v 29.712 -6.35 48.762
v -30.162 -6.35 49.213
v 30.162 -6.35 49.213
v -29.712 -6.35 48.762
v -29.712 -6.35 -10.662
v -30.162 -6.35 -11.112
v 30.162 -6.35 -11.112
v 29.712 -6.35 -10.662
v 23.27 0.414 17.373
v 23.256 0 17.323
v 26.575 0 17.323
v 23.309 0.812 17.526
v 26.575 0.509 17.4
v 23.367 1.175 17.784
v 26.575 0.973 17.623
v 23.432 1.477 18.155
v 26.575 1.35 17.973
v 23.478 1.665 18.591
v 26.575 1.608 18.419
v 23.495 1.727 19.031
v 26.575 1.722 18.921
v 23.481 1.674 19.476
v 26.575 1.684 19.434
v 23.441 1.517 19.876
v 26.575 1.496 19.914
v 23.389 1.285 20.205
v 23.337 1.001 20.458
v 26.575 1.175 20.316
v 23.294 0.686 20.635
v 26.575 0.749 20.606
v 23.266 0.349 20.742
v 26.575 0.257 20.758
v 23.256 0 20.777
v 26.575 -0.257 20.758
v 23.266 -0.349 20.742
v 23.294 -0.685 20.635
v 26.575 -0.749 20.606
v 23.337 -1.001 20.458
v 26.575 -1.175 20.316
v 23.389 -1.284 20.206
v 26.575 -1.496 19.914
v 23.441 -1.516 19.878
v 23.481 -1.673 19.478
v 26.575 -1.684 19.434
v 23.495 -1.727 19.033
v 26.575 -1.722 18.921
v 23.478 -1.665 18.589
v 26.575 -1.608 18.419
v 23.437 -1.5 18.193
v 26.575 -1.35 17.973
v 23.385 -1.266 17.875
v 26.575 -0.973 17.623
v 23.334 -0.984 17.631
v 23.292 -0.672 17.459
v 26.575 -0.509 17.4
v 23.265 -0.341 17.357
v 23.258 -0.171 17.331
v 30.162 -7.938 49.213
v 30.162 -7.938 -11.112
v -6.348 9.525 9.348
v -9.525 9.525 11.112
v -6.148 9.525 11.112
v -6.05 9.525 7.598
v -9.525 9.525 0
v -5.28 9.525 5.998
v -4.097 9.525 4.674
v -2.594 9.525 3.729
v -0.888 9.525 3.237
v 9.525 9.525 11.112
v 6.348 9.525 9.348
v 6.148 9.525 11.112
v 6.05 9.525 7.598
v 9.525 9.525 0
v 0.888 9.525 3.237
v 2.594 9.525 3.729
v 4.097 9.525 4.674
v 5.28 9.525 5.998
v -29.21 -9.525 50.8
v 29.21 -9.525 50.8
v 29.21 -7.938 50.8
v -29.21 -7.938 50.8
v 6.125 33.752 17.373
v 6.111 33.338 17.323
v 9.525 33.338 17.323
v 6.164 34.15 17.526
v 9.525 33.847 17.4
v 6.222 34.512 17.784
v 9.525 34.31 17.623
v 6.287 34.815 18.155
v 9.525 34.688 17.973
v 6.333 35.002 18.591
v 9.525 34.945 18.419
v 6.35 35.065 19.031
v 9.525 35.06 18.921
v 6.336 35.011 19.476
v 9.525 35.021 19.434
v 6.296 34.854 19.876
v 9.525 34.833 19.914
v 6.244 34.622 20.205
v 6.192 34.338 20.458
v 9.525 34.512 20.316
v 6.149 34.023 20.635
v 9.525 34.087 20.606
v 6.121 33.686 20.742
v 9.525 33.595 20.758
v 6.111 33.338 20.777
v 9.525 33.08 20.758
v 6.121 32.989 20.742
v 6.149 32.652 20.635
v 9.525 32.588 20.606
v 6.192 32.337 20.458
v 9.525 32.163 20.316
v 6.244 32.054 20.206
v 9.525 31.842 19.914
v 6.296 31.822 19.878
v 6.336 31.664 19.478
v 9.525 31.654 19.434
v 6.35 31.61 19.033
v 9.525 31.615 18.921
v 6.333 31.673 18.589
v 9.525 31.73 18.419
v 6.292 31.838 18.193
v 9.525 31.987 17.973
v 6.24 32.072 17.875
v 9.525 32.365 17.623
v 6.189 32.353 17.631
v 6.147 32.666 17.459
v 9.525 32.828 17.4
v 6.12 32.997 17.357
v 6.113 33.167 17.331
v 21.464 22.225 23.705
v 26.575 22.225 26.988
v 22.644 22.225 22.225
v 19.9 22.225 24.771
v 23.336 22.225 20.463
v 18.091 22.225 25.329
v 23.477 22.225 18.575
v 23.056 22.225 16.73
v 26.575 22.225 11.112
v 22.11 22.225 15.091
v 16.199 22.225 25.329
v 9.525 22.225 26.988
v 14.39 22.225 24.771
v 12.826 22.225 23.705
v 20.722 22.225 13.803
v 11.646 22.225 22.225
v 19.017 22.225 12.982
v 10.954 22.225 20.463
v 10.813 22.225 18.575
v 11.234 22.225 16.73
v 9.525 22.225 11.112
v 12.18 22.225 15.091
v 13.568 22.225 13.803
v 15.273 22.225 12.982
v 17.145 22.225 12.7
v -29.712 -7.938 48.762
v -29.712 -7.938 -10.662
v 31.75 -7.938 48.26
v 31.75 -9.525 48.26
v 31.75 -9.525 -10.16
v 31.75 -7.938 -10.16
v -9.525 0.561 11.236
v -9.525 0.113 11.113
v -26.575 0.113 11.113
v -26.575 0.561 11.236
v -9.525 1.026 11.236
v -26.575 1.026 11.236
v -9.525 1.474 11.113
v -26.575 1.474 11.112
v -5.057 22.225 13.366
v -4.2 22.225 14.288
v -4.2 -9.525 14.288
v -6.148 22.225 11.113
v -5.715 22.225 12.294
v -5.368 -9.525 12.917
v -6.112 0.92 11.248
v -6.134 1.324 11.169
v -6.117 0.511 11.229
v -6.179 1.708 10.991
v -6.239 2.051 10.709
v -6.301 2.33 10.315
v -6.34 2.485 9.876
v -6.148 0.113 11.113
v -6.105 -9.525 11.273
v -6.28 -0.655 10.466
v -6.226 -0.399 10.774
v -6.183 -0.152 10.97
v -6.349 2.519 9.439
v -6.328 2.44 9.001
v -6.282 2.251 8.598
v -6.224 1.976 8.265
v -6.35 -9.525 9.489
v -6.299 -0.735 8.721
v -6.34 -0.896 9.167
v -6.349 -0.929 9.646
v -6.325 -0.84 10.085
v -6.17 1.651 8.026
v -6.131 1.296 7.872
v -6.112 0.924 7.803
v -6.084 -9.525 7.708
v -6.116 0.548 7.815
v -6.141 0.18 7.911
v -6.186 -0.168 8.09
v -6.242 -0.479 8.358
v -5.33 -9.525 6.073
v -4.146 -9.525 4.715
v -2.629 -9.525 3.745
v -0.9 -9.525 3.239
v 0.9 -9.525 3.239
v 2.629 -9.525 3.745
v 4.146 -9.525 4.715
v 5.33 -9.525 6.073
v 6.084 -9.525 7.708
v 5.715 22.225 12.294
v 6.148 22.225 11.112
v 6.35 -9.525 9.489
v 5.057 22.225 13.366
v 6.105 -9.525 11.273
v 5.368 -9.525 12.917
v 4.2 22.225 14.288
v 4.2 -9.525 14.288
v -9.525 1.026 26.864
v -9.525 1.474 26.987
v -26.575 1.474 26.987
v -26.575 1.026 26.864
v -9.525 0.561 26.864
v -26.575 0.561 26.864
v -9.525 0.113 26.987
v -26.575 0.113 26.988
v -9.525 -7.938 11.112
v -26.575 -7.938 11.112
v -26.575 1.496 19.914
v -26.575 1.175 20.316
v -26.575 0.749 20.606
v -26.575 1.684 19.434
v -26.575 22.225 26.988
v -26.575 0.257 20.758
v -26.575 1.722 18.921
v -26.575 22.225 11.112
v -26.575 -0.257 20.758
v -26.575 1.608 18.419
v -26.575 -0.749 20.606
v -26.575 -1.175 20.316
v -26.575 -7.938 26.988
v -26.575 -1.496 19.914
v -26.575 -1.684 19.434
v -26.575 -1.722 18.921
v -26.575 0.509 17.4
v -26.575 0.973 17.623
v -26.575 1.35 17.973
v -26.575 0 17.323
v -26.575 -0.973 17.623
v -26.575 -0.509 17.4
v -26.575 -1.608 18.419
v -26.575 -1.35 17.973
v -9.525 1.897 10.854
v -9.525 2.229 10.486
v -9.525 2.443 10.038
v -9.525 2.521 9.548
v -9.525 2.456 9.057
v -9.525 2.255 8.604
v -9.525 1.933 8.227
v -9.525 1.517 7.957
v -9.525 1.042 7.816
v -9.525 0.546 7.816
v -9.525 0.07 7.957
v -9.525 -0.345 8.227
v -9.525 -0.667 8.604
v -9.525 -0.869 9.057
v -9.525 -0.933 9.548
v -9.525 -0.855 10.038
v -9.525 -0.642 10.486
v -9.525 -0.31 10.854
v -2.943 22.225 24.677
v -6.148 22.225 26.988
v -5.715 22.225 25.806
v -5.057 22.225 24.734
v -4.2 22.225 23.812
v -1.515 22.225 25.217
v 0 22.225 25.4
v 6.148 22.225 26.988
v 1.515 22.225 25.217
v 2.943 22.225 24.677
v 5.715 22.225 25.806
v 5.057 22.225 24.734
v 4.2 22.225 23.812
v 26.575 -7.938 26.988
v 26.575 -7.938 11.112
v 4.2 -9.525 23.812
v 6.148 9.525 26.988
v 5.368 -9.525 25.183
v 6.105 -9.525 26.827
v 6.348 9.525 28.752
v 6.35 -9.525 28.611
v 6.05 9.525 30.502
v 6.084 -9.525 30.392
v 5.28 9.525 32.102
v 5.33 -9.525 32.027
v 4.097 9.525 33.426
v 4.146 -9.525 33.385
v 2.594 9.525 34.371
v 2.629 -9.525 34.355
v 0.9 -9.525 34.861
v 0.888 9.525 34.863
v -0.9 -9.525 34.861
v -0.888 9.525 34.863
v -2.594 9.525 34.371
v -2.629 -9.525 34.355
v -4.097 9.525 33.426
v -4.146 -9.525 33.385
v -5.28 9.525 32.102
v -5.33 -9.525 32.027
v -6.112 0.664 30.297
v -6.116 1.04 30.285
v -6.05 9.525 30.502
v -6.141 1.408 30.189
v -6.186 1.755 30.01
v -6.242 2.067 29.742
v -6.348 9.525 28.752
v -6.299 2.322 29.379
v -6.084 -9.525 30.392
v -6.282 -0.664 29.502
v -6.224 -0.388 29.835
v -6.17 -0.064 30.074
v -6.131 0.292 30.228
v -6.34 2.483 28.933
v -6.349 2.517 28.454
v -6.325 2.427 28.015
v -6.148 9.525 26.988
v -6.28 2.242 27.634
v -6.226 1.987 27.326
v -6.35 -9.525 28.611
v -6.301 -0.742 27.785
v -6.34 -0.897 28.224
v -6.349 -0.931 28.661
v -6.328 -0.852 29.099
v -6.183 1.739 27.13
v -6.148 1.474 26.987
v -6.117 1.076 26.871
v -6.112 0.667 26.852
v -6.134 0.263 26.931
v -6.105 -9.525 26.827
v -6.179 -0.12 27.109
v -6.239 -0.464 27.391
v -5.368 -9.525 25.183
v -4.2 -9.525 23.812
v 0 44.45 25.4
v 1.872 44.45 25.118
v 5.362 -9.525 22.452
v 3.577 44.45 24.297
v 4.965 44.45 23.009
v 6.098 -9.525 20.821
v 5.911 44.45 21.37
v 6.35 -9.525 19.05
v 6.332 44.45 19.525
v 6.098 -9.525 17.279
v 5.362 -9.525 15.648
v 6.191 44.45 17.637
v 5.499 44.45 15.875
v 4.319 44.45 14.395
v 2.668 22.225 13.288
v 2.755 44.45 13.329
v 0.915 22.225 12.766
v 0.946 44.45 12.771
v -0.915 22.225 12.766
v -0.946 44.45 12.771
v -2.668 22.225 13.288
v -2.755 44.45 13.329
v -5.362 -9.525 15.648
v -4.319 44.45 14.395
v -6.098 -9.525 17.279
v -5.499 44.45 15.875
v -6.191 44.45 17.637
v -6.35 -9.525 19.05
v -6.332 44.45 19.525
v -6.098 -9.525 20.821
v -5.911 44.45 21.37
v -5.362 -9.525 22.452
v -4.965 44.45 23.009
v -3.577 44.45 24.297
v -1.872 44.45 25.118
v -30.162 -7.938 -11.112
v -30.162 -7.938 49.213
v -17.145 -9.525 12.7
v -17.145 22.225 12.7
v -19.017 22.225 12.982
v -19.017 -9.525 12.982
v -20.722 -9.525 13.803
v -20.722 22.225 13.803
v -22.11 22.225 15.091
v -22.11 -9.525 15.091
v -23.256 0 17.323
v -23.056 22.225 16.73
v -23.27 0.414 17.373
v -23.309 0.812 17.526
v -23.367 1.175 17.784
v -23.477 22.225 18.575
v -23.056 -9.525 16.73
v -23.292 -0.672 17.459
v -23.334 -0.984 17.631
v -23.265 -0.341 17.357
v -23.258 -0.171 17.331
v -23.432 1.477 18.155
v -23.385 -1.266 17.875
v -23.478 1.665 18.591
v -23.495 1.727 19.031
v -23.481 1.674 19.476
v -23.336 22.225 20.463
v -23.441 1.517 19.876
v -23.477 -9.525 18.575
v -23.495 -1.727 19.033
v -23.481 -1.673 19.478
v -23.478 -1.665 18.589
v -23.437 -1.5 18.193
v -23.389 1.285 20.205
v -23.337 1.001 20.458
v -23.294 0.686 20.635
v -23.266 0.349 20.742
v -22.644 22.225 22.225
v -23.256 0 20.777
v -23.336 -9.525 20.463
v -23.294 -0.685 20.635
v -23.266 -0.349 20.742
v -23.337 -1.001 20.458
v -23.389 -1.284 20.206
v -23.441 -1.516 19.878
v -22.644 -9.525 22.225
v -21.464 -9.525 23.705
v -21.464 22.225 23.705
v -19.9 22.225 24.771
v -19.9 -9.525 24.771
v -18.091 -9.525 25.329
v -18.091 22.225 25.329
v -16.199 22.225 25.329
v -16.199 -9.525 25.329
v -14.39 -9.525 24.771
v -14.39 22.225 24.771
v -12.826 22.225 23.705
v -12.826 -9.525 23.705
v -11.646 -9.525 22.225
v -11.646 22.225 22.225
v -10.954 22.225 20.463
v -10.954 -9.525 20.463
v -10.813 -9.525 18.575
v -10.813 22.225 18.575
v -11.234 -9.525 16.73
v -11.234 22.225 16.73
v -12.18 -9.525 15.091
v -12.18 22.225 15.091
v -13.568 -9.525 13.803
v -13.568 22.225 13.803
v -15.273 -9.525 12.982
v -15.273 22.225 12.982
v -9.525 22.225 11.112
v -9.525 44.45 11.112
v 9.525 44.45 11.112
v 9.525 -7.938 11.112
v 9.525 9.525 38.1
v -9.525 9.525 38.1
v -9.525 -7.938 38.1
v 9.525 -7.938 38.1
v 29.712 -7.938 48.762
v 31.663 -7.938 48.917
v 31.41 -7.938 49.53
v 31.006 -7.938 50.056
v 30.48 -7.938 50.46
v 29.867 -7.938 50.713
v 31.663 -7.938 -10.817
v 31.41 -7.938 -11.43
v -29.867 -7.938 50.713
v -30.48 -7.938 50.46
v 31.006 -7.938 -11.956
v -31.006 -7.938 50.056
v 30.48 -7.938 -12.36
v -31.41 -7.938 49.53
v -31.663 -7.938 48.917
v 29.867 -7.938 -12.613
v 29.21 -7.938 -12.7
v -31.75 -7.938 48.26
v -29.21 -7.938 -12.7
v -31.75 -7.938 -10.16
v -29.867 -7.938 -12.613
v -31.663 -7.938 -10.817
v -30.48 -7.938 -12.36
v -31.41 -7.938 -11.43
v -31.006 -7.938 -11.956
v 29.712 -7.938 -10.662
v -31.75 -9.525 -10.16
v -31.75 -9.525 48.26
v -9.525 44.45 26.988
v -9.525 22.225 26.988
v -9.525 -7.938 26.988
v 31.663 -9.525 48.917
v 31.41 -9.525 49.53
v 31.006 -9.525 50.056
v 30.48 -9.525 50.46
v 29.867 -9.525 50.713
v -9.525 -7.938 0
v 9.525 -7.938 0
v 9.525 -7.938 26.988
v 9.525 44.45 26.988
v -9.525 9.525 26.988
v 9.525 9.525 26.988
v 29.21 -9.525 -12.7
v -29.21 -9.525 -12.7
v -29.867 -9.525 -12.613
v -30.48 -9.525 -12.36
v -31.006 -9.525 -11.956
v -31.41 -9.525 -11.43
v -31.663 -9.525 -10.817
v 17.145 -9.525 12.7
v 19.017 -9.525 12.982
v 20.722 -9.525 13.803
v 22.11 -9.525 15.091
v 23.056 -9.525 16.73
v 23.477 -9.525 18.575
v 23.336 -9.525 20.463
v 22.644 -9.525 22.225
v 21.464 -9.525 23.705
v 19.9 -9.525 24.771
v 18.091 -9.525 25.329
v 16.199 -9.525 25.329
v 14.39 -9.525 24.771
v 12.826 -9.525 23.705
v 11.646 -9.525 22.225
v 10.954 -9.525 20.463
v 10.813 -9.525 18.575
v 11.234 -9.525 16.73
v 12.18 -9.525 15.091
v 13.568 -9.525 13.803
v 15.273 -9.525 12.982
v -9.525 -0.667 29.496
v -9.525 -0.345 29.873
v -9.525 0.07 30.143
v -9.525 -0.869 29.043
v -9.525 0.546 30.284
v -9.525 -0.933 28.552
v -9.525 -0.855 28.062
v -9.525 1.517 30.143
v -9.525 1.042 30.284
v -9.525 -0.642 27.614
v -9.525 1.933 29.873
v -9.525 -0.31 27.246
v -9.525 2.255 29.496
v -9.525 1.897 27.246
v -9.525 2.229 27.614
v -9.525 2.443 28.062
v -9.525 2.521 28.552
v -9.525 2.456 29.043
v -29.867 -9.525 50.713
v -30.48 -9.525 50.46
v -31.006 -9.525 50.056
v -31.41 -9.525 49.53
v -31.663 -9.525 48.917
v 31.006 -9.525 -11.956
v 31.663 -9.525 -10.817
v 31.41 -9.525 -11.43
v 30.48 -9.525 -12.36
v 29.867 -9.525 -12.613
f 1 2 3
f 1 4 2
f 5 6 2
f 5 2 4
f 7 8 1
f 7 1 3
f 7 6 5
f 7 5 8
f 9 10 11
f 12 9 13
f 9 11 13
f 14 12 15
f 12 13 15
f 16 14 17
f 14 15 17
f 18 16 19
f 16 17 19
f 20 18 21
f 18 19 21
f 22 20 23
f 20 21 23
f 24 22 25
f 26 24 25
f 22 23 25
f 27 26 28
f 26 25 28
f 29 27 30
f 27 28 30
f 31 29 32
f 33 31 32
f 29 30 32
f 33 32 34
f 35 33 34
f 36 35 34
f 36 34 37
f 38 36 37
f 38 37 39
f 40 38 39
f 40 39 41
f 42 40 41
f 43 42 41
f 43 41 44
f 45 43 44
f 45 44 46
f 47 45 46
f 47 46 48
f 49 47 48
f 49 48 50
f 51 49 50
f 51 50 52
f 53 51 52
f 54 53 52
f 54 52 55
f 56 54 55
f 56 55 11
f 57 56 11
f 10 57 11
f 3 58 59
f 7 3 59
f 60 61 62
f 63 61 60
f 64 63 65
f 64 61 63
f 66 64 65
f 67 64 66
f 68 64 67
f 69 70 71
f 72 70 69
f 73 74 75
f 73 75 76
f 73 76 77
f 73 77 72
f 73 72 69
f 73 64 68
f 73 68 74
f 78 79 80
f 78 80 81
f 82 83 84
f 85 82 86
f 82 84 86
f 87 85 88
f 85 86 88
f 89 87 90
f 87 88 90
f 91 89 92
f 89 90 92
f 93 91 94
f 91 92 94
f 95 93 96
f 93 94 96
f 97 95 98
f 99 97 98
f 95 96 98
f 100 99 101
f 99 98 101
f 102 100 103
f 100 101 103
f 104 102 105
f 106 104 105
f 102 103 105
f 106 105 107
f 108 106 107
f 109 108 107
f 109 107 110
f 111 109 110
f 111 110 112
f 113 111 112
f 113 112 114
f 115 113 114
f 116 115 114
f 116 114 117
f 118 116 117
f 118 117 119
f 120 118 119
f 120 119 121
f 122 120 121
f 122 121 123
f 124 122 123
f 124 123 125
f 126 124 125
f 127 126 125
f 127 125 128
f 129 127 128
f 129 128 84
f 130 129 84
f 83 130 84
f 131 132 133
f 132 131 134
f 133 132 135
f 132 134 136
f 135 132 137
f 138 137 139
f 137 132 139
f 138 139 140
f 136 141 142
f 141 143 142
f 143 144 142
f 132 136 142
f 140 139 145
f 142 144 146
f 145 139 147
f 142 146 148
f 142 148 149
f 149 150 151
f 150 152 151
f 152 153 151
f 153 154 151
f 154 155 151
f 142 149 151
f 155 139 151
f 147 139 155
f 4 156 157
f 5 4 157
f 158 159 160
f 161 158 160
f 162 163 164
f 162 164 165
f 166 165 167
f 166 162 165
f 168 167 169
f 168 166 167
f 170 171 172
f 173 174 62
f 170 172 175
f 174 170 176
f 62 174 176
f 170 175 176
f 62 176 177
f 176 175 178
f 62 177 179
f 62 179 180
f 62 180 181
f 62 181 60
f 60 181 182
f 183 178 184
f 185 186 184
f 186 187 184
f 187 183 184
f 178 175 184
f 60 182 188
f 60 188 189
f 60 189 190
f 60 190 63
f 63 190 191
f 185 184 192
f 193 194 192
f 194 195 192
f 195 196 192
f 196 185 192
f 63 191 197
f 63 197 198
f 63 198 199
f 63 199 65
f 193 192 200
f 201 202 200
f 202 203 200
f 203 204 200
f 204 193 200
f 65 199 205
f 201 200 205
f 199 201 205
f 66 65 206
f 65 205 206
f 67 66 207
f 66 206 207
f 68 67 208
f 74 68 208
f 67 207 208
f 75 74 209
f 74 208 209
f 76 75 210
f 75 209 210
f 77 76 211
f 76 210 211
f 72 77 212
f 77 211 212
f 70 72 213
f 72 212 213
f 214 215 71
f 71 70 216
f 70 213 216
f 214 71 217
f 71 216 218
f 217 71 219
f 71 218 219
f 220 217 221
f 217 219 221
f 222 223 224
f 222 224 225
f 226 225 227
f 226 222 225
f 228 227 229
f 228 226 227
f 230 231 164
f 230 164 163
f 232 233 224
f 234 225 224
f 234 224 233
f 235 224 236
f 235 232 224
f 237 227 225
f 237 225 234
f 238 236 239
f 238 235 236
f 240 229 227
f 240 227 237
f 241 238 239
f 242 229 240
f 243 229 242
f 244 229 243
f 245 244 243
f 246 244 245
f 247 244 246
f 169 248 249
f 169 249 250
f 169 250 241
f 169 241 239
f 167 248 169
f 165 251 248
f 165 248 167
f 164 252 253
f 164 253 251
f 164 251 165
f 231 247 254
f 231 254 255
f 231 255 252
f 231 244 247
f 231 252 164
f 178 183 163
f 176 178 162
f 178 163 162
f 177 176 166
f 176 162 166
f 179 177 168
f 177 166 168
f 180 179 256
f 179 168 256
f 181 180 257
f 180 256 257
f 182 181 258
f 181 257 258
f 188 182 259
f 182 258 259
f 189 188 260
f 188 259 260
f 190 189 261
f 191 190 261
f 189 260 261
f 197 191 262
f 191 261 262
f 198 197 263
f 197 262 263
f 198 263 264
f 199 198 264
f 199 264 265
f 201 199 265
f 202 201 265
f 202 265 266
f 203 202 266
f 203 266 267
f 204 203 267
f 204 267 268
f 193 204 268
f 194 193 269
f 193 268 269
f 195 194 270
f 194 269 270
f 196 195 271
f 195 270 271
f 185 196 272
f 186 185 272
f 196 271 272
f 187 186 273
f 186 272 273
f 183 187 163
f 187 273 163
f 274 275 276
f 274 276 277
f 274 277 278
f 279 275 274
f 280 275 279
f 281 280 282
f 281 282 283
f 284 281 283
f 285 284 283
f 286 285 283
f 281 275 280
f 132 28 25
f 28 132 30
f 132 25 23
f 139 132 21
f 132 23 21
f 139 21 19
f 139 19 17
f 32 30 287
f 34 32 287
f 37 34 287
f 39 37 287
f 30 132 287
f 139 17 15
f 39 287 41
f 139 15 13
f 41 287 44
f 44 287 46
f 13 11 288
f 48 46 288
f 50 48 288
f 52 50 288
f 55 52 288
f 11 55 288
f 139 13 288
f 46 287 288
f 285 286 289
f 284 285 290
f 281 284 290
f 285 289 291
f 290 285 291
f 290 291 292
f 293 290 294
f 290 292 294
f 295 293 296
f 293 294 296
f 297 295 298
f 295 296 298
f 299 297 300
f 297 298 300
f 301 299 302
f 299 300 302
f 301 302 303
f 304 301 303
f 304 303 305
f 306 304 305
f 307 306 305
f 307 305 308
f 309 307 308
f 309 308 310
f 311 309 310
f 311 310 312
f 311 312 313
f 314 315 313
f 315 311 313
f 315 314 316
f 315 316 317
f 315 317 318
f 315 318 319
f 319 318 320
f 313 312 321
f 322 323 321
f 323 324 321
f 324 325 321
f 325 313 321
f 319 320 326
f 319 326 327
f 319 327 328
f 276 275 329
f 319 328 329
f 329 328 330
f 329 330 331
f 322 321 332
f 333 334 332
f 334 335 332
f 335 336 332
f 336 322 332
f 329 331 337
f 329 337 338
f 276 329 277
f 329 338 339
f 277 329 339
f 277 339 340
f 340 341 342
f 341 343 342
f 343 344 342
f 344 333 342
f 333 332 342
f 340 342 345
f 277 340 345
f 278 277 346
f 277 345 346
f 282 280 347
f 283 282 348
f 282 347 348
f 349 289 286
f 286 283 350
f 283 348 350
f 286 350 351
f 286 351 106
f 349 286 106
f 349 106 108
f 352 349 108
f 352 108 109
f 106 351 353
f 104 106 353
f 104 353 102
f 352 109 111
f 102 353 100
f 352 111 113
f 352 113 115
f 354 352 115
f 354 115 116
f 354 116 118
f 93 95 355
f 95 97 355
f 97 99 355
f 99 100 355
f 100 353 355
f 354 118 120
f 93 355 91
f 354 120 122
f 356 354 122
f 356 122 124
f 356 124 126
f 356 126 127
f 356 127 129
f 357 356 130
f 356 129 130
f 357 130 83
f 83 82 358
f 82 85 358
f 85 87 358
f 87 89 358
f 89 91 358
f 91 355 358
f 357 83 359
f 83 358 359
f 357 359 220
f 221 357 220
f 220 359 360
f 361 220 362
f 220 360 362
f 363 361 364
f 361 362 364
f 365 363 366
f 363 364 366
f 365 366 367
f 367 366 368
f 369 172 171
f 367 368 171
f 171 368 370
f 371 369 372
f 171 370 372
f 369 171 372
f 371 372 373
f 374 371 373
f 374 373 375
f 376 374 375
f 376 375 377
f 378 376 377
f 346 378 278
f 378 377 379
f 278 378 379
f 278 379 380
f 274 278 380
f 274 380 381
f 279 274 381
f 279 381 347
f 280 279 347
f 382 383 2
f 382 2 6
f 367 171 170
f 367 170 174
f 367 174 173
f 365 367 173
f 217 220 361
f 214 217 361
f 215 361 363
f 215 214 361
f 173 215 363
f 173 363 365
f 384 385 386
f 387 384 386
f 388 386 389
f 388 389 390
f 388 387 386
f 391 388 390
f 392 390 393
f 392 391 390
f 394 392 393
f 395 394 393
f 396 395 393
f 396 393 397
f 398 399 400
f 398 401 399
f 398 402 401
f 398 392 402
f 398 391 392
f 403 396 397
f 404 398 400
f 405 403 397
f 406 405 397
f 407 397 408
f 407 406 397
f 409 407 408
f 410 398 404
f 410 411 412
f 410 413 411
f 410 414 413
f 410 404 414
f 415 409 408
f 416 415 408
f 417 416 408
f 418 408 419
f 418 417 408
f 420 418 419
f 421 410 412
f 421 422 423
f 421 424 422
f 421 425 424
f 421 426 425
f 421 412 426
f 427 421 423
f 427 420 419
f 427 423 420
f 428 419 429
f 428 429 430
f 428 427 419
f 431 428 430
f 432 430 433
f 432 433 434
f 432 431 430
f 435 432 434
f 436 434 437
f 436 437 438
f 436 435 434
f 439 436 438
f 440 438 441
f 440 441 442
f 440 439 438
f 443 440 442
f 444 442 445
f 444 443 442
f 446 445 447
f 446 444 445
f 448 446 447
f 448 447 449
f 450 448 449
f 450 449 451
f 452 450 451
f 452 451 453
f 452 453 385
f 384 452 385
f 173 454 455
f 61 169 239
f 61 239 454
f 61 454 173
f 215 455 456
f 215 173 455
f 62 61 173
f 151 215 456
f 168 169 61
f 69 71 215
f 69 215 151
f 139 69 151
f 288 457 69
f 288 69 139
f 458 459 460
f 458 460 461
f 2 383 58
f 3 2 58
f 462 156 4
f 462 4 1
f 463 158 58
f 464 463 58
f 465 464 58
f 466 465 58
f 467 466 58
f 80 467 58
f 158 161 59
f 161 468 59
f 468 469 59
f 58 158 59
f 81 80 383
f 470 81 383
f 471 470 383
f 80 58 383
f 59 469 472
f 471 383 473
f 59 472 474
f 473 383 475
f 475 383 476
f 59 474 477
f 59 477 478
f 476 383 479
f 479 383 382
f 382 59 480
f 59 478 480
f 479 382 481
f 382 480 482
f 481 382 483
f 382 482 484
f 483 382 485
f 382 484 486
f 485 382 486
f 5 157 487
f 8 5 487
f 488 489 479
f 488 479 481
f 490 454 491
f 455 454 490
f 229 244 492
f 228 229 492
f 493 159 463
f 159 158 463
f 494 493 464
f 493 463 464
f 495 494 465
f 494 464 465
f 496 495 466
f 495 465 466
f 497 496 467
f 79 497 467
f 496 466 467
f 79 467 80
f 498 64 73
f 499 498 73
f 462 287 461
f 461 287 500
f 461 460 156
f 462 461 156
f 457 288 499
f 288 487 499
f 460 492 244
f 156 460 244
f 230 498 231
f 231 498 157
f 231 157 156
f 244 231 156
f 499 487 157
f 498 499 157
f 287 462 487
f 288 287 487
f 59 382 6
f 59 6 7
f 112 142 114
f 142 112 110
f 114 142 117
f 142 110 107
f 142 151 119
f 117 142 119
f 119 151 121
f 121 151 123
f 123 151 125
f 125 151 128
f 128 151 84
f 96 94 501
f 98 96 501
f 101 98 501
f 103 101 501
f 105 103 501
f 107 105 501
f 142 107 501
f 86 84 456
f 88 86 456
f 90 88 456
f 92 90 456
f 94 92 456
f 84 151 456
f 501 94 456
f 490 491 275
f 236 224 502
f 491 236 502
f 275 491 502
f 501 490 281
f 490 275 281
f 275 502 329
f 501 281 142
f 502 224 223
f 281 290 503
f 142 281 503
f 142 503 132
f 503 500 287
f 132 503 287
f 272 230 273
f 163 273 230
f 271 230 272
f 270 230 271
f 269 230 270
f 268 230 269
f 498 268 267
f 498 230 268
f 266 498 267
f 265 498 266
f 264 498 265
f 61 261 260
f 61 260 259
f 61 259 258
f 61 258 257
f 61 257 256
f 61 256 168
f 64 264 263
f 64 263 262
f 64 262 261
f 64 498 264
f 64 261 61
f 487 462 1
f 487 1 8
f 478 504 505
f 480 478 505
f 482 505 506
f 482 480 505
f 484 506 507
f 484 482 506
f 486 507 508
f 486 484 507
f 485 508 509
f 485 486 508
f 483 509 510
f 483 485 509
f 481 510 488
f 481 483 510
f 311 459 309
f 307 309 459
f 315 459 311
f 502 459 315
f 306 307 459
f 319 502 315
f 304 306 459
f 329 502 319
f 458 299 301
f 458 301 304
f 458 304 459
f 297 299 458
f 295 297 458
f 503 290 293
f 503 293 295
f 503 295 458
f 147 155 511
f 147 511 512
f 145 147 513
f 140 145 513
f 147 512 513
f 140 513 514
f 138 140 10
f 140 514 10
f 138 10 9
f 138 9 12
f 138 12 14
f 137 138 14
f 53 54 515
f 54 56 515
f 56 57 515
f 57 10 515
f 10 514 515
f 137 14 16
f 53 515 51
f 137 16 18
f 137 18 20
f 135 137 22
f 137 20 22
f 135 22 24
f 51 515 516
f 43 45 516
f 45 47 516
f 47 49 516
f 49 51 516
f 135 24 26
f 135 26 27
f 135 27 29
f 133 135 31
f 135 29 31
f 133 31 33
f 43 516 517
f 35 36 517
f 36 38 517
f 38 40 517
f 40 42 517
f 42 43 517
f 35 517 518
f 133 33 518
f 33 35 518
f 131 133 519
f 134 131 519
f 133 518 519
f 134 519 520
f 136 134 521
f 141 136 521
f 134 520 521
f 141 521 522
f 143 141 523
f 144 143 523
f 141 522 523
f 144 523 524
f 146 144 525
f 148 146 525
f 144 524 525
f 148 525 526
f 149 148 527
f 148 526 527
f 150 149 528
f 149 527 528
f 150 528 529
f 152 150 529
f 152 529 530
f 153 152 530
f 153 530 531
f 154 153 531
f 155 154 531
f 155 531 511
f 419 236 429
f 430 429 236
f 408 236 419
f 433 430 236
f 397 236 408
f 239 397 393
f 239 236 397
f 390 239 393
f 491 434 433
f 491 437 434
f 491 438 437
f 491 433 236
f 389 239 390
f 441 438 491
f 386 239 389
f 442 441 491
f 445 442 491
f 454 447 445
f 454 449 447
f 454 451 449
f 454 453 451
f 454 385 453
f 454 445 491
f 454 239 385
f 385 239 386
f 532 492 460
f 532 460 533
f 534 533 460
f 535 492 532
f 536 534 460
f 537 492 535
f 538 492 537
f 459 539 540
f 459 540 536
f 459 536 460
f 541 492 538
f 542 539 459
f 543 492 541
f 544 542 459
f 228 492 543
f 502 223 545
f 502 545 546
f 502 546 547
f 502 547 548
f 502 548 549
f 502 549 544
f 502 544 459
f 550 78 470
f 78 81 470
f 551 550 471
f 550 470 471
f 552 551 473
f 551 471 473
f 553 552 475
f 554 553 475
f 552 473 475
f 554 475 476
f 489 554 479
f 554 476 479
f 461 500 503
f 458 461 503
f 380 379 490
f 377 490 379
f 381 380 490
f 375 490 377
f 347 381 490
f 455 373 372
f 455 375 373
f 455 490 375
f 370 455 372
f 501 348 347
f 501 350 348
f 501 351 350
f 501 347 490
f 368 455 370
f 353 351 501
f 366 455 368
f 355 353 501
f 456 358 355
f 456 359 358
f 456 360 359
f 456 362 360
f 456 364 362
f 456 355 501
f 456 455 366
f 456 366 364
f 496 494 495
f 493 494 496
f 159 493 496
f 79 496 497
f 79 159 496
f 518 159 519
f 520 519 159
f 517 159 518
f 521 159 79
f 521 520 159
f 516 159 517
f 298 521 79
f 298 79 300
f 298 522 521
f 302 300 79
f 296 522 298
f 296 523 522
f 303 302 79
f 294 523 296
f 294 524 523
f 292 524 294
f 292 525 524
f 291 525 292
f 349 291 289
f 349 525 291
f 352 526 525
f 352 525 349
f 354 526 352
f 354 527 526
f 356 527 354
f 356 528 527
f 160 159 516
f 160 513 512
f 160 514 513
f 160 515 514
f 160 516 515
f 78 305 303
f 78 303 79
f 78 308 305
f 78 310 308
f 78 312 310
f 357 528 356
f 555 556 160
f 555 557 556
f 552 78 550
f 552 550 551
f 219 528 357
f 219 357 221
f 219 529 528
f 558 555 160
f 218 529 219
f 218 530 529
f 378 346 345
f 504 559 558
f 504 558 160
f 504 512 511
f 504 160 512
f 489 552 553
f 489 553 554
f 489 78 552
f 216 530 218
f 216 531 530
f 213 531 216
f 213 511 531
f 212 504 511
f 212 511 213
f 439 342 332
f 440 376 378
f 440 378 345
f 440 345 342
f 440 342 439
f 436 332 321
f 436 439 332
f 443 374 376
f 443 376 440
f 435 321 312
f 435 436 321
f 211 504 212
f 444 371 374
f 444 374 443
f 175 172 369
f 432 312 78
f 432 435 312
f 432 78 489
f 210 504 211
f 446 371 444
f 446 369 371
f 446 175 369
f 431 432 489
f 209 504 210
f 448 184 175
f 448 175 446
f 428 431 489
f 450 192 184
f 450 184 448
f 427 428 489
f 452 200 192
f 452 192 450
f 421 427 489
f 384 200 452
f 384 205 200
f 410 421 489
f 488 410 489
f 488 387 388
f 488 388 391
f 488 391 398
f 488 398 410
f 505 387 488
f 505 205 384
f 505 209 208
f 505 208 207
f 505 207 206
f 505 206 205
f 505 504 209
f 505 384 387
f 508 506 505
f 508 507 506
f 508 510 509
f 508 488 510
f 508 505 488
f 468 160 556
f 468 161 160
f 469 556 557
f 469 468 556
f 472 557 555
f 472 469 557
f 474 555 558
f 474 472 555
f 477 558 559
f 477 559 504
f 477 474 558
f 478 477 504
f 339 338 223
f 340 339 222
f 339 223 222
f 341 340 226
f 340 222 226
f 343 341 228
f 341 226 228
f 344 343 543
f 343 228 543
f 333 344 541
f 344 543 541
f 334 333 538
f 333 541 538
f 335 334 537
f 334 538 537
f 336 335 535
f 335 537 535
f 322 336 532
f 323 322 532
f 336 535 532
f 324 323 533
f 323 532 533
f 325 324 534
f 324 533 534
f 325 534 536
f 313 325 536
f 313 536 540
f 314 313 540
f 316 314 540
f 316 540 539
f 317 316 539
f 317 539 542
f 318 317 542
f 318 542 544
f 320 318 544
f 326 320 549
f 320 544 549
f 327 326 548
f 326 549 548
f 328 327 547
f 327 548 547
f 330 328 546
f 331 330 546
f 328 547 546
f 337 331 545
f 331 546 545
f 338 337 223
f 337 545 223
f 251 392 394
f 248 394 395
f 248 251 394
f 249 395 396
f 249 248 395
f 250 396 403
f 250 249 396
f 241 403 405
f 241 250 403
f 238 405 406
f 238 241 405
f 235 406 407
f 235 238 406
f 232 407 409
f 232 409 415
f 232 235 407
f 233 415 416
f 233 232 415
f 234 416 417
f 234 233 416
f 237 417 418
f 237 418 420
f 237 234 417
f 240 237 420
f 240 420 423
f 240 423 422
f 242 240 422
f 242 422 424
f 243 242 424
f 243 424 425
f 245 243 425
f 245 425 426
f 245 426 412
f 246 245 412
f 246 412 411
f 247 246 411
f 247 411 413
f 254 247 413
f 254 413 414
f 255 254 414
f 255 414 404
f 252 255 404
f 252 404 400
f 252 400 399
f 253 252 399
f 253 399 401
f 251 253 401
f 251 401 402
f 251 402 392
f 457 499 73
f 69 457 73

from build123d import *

# Parameters (mm, degrees)
SKETCH1_W                       = 19.05
SKETCH1_H                       = 19.05
BOSS_EXTRUDE1_DEPTH             = 38.1
SKETCH6_W                       = 19.05
SKETCH6_H                       = 15.875
BOSS_EXTRUDE3_DEPTH             = 34.925
SKETCH2_R                       = 6.35
CUT_EXTRUDE1_DEPTH              = 31.75
SKETCH8_R                       = 6.35
CUT_EXTRUDE4_DEPTH              = 67.750552432
SKETCH10_W                      = 17.05
SKETCH10_H                      = 15.875
BOSS_EXTRUDE4_DEPTH             = 31.75
SKETCH11_R                      = 6.35
CUT_EXTRUDE6_DEPTH              = 31.75
CUT_EXTRUDE7_REACH              = 70.78
CUT_EXTRUDE7_END_RADIUS         = 6.35
SKETCH12_R                      = 1.7272
SKETCH13_W                      = 63.5
SKETCH13_H                      = 63.5
BOSS_EXTRUDE5_DEPTH             = 1.5875
CUT_EXTRUDE9_REACH              = 81.121
CUT_EXTRUDE9_END_RADIUS         = 6.35
SKETCH15_R                      = 1.7272
SKETCH16_W                      = 60.325
SKETCH16_H                      = 60.325
SKETCH16_W_2                    = 59.425
SKETCH16_H_2                    = 59.425
BOSS_EXTRUDE6_DEPTH             = 1.5875
FILLET1_R                       = 2.54
CUT_EXTRUDE10_REACH             = 81.121
SKETCH18_R                      = 1.7272
CUT_EXTRUDE10_DIRECTION_2_DEPTH = 80.12059235


with BuildPart() as part:
    # Sketch1 → Boss-Extrude1 (new body)
    with BuildSketch(Plane.XY):
        Rectangle(SKETCH1_W, SKETCH1_H)
    extrude(amount=BOSS_EXTRUDE1_DEPTH)

    # Sketch6 → Boss-Extrude3 (add)
    with BuildSketch(Plane(origin=(0, 9.525, 0), x_dir=(1, 0, 0), z_dir=(0, 1, 0))):
        with Locations((0, -19.05)):
            Rectangle(SKETCH6_W, SKETCH6_H)
    extrude(amount=BOSS_EXTRUDE3_DEPTH)

    # Sketch2 → Cut-Extrude1 (cut)
    with BuildSketch(Plane(origin=(0, -9.525, 0), x_dir=(-1, 0, 0), z_dir=(0, -1, 0))):
        with Locations(Location((0, -28.575, 0), (0, 0, 90))):
            Circle(SKETCH2_R)
        with Locations(Location((0, -9.525, 0), (0, 0, 90))):
            Circle(SKETCH2_R)
    extrude(amount=-CUT_EXTRUDE1_DEPTH, mode=Mode.SUBTRACT)

    # Sketch8 → Cut-Extrude4 (cut, through all)
    with BuildSketch(Plane(origin=(0, 44.45, 0), x_dir=(1, 0, 0), z_dir=(0, 1, 0))):
        with Locations(Location((0, -19.05, 0), (0, 0, 270))):
            Circle(SKETCH8_R)
    extrude(amount=-CUT_EXTRUDE4_DEPTH, mode=Mode.SUBTRACT)

    # Sketch10 → Boss-Extrude4 (add)
    with BuildSketch(Plane(origin=(0, -9.525, 0), x_dir=(-1, 0, 0), z_dir=(0, -1, 0))):
        with Locations((-18.05, -19.05)):
            Rectangle(SKETCH10_W, SKETCH10_H)
    boss_extrude4 = extrude(amount=-BOSS_EXTRUDE4_DEPTH)

    # Sketch11 → Cut-Extrude6 (cut)
    with BuildSketch(Plane(origin=(0, -9.525, 0), x_dir=(-1, 0, 0), z_dir=(0, -1, 0))):
        with Locations(Location((-17.145, -19.05, 0), (0, 0, 90))):
            Circle(SKETCH11_R)
    cut_extrude6 = extrude(amount=-CUT_EXTRUDE6_DEPTH, mode=Mode.SUBTRACT)

    # Cut-Extrude7: up to this cylinder (the profile starts outside it)
    cut_extrude7_end = Plane(origin=(17.145, 0, 19.05), z_dir=(0, -1, 0)) * Cylinder(CUT_EXTRUDE7_END_RADIUS, 155.26, mode=Mode.PRIVATE)
    # Sketch12 → Cut-Extrude7 (cut, up to the surface)
    with BuildSketch(Plane(origin=(26.575, 0, 0), x_dir=(0, 0, -1), z_dir=(1, 0, 0)), mode=Mode.PRIVATE) as cut_extrude7_sk1:
        with Locations((-19.05, 0)):
            Circle(SKETCH12_R)
    cut_extrude7_tool1 = extrude(cut_extrude7_sk1.sketch, amount=-CUT_EXTRUDE7_REACH, mode=Mode.PRIVATE) - cut_extrude7_end
    cut_extrude7 = cut_extrude7_tool1.solids().sort_by_distance((26.575, 0, 19.05))[0]
    add(cut_extrude7, mode=Mode.SUBTRACT)

    # Mirror1: Boss-Extrude4, Cut-Extrude6, Cut-Extrude7 across plane
    add(boss_extrude4.mirror(Plane(origin=(0, 0, 0), x_dir=(0, 0, 1), z_dir=(1, 0, 0))))
    add(cut_extrude6.mirror(Plane(origin=(0, 0, 0), x_dir=(0, 0, 1), z_dir=(1, 0, 0))), mode=Mode.SUBTRACT)
    add(cut_extrude7.mirror(Plane(origin=(0, 0, 0), x_dir=(0, 0, 1), z_dir=(1, 0, 0))), mode=Mode.SUBTRACT)

    # Sketch13 → Boss-Extrude5 (add)
    with BuildSketch(Plane(origin=(0, -9.525, 0), x_dir=(-1, 0, 0), z_dir=(0, -1, 0))):
        with Locations((0, -19.05)):
            Rectangle(SKETCH13_W, SKETCH13_H)
        Polygon((9.525, -26.9875), (26.575, -26.9875), (26.575, -11.1125), (9.525, -11.1125), (9.525, 0), (-9.525, 0), (-9.525, -11.1125), (-26.575, -11.1125), (-26.575, -26.9875), (-9.525, -26.9875), (-9.525, -38.1), (9.525, -38.1), align=None, mode=Mode.SUBTRACT)
    extrude(amount=-BOSS_EXTRUDE5_DEPTH)

    # Cut-Extrude9: up to this cylinder (the profile starts outside it)
    cut_extrude9_end = Plane(origin=(0, 33.3375, 19.05), z_dir=(0, 1, 0)) * Cylinder(CUT_EXTRUDE9_END_RADIUS, 175.942, mode=Mode.PRIVATE)
    # Sketch15 → Cut-Extrude9 (cut, up to the surface)
    with BuildSketch(Plane(origin=(9.525, 0, 0), x_dir=(0, 0, -1), z_dir=(1, 0, 0)), mode=Mode.PRIVATE) as cut_extrude9_sk1:
        with Locations((-19.05, 33.3375)):
            Circle(SKETCH15_R)
    cut_extrude9_tool1 = extrude(cut_extrude9_sk1.sketch, amount=-CUT_EXTRUDE9_REACH, mode=Mode.PRIVATE) - cut_extrude9_end
    add(cut_extrude9_tool1.solids().sort_by_distance((9.525, 33.3375, 19.05))[0], mode=Mode.SUBTRACT)

    # Sketch16 → Boss-Extrude6 (add)
    with BuildSketch(Plane(origin=(0, -7.9375, 0), x_dir=(1, 0, 0), z_dir=(0, 1, 0))):
        with Locations((0, -19.05)):
            Rectangle(SKETCH16_W, SKETCH16_H)
        with Locations((0, -19.05)):
            Rectangle(SKETCH16_W_2, SKETCH16_H_2, mode=Mode.SUBTRACT)
    extrude(amount=BOSS_EXTRUDE6_DEPTH)

    # Fillet1
    fillet1_edges = [part.edges().sort_by_distance(p)[0] for p in [
        (31.75, -8.73125, 50.8),
        (31.75, -8.73125, -12.7),
        (-31.75, -8.73125, -12.7),
        (-31.75, -8.73125, 50.8),
    ]]
    fillet(fillet1_edges, radius=FILLET1_R)

    # Sketch18 → Cut-Extrude10 (cut, up to next)
    with BuildSketch(Plane.ZY.offset(9.525), mode=Mode.PRIVATE) as cut_extrude10_sk1:
        with Locations(Location((28.575, 0.79375, 0), (0, 0, 156.797426943))):
            Circle(SKETCH18_R)
    cut_extrude10_tool1 = extrude(cut_extrude10_sk1.sketch, amount=-CUT_EXTRUDE10_REACH, mode=Mode.PRIVATE) & part.part
    # Sketch18 → Cut-Extrude10 (cut, up to next)
    with BuildSketch(Plane.ZY.offset(9.525), mode=Mode.PRIVATE) as cut_extrude10_sk2:
        with Locations(Location((9.525, 0.79375, 0), (0, 0, 336.797426943))):
            Circle(SKETCH18_R)
    cut_extrude10_tool2 = extrude(cut_extrude10_sk2.sketch, amount=-CUT_EXTRUDE10_REACH, mode=Mode.PRIVATE) & part.part
    add(cut_extrude10_tool1.solids().sort_by_distance((-9.525, 0.79375, 28.575))[0], mode=Mode.SUBTRACT)
    add(cut_extrude10_tool2.solids().sort_by_distance((-9.525, 0.79375, 9.525))[0], mode=Mode.SUBTRACT)

    # Sketch18 → Cut-Extrude10 direction 2 (cut)
    with BuildSketch(Plane.ZY.offset(9.525)):
        with Locations(Location((28.575, 0.79375, 0), (0, 0, 156.797426943))):
            Circle(SKETCH18_R)
        with Locations(Location((9.525, 0.79375, 0), (0, 0, 336.797426943))):
            Circle(SKETCH18_R)
    extrude(amount=CUT_EXTRUDE10_DIRECTION_2_DEPTH, mode=Mode.SUBTRACT)


solid = part.part
